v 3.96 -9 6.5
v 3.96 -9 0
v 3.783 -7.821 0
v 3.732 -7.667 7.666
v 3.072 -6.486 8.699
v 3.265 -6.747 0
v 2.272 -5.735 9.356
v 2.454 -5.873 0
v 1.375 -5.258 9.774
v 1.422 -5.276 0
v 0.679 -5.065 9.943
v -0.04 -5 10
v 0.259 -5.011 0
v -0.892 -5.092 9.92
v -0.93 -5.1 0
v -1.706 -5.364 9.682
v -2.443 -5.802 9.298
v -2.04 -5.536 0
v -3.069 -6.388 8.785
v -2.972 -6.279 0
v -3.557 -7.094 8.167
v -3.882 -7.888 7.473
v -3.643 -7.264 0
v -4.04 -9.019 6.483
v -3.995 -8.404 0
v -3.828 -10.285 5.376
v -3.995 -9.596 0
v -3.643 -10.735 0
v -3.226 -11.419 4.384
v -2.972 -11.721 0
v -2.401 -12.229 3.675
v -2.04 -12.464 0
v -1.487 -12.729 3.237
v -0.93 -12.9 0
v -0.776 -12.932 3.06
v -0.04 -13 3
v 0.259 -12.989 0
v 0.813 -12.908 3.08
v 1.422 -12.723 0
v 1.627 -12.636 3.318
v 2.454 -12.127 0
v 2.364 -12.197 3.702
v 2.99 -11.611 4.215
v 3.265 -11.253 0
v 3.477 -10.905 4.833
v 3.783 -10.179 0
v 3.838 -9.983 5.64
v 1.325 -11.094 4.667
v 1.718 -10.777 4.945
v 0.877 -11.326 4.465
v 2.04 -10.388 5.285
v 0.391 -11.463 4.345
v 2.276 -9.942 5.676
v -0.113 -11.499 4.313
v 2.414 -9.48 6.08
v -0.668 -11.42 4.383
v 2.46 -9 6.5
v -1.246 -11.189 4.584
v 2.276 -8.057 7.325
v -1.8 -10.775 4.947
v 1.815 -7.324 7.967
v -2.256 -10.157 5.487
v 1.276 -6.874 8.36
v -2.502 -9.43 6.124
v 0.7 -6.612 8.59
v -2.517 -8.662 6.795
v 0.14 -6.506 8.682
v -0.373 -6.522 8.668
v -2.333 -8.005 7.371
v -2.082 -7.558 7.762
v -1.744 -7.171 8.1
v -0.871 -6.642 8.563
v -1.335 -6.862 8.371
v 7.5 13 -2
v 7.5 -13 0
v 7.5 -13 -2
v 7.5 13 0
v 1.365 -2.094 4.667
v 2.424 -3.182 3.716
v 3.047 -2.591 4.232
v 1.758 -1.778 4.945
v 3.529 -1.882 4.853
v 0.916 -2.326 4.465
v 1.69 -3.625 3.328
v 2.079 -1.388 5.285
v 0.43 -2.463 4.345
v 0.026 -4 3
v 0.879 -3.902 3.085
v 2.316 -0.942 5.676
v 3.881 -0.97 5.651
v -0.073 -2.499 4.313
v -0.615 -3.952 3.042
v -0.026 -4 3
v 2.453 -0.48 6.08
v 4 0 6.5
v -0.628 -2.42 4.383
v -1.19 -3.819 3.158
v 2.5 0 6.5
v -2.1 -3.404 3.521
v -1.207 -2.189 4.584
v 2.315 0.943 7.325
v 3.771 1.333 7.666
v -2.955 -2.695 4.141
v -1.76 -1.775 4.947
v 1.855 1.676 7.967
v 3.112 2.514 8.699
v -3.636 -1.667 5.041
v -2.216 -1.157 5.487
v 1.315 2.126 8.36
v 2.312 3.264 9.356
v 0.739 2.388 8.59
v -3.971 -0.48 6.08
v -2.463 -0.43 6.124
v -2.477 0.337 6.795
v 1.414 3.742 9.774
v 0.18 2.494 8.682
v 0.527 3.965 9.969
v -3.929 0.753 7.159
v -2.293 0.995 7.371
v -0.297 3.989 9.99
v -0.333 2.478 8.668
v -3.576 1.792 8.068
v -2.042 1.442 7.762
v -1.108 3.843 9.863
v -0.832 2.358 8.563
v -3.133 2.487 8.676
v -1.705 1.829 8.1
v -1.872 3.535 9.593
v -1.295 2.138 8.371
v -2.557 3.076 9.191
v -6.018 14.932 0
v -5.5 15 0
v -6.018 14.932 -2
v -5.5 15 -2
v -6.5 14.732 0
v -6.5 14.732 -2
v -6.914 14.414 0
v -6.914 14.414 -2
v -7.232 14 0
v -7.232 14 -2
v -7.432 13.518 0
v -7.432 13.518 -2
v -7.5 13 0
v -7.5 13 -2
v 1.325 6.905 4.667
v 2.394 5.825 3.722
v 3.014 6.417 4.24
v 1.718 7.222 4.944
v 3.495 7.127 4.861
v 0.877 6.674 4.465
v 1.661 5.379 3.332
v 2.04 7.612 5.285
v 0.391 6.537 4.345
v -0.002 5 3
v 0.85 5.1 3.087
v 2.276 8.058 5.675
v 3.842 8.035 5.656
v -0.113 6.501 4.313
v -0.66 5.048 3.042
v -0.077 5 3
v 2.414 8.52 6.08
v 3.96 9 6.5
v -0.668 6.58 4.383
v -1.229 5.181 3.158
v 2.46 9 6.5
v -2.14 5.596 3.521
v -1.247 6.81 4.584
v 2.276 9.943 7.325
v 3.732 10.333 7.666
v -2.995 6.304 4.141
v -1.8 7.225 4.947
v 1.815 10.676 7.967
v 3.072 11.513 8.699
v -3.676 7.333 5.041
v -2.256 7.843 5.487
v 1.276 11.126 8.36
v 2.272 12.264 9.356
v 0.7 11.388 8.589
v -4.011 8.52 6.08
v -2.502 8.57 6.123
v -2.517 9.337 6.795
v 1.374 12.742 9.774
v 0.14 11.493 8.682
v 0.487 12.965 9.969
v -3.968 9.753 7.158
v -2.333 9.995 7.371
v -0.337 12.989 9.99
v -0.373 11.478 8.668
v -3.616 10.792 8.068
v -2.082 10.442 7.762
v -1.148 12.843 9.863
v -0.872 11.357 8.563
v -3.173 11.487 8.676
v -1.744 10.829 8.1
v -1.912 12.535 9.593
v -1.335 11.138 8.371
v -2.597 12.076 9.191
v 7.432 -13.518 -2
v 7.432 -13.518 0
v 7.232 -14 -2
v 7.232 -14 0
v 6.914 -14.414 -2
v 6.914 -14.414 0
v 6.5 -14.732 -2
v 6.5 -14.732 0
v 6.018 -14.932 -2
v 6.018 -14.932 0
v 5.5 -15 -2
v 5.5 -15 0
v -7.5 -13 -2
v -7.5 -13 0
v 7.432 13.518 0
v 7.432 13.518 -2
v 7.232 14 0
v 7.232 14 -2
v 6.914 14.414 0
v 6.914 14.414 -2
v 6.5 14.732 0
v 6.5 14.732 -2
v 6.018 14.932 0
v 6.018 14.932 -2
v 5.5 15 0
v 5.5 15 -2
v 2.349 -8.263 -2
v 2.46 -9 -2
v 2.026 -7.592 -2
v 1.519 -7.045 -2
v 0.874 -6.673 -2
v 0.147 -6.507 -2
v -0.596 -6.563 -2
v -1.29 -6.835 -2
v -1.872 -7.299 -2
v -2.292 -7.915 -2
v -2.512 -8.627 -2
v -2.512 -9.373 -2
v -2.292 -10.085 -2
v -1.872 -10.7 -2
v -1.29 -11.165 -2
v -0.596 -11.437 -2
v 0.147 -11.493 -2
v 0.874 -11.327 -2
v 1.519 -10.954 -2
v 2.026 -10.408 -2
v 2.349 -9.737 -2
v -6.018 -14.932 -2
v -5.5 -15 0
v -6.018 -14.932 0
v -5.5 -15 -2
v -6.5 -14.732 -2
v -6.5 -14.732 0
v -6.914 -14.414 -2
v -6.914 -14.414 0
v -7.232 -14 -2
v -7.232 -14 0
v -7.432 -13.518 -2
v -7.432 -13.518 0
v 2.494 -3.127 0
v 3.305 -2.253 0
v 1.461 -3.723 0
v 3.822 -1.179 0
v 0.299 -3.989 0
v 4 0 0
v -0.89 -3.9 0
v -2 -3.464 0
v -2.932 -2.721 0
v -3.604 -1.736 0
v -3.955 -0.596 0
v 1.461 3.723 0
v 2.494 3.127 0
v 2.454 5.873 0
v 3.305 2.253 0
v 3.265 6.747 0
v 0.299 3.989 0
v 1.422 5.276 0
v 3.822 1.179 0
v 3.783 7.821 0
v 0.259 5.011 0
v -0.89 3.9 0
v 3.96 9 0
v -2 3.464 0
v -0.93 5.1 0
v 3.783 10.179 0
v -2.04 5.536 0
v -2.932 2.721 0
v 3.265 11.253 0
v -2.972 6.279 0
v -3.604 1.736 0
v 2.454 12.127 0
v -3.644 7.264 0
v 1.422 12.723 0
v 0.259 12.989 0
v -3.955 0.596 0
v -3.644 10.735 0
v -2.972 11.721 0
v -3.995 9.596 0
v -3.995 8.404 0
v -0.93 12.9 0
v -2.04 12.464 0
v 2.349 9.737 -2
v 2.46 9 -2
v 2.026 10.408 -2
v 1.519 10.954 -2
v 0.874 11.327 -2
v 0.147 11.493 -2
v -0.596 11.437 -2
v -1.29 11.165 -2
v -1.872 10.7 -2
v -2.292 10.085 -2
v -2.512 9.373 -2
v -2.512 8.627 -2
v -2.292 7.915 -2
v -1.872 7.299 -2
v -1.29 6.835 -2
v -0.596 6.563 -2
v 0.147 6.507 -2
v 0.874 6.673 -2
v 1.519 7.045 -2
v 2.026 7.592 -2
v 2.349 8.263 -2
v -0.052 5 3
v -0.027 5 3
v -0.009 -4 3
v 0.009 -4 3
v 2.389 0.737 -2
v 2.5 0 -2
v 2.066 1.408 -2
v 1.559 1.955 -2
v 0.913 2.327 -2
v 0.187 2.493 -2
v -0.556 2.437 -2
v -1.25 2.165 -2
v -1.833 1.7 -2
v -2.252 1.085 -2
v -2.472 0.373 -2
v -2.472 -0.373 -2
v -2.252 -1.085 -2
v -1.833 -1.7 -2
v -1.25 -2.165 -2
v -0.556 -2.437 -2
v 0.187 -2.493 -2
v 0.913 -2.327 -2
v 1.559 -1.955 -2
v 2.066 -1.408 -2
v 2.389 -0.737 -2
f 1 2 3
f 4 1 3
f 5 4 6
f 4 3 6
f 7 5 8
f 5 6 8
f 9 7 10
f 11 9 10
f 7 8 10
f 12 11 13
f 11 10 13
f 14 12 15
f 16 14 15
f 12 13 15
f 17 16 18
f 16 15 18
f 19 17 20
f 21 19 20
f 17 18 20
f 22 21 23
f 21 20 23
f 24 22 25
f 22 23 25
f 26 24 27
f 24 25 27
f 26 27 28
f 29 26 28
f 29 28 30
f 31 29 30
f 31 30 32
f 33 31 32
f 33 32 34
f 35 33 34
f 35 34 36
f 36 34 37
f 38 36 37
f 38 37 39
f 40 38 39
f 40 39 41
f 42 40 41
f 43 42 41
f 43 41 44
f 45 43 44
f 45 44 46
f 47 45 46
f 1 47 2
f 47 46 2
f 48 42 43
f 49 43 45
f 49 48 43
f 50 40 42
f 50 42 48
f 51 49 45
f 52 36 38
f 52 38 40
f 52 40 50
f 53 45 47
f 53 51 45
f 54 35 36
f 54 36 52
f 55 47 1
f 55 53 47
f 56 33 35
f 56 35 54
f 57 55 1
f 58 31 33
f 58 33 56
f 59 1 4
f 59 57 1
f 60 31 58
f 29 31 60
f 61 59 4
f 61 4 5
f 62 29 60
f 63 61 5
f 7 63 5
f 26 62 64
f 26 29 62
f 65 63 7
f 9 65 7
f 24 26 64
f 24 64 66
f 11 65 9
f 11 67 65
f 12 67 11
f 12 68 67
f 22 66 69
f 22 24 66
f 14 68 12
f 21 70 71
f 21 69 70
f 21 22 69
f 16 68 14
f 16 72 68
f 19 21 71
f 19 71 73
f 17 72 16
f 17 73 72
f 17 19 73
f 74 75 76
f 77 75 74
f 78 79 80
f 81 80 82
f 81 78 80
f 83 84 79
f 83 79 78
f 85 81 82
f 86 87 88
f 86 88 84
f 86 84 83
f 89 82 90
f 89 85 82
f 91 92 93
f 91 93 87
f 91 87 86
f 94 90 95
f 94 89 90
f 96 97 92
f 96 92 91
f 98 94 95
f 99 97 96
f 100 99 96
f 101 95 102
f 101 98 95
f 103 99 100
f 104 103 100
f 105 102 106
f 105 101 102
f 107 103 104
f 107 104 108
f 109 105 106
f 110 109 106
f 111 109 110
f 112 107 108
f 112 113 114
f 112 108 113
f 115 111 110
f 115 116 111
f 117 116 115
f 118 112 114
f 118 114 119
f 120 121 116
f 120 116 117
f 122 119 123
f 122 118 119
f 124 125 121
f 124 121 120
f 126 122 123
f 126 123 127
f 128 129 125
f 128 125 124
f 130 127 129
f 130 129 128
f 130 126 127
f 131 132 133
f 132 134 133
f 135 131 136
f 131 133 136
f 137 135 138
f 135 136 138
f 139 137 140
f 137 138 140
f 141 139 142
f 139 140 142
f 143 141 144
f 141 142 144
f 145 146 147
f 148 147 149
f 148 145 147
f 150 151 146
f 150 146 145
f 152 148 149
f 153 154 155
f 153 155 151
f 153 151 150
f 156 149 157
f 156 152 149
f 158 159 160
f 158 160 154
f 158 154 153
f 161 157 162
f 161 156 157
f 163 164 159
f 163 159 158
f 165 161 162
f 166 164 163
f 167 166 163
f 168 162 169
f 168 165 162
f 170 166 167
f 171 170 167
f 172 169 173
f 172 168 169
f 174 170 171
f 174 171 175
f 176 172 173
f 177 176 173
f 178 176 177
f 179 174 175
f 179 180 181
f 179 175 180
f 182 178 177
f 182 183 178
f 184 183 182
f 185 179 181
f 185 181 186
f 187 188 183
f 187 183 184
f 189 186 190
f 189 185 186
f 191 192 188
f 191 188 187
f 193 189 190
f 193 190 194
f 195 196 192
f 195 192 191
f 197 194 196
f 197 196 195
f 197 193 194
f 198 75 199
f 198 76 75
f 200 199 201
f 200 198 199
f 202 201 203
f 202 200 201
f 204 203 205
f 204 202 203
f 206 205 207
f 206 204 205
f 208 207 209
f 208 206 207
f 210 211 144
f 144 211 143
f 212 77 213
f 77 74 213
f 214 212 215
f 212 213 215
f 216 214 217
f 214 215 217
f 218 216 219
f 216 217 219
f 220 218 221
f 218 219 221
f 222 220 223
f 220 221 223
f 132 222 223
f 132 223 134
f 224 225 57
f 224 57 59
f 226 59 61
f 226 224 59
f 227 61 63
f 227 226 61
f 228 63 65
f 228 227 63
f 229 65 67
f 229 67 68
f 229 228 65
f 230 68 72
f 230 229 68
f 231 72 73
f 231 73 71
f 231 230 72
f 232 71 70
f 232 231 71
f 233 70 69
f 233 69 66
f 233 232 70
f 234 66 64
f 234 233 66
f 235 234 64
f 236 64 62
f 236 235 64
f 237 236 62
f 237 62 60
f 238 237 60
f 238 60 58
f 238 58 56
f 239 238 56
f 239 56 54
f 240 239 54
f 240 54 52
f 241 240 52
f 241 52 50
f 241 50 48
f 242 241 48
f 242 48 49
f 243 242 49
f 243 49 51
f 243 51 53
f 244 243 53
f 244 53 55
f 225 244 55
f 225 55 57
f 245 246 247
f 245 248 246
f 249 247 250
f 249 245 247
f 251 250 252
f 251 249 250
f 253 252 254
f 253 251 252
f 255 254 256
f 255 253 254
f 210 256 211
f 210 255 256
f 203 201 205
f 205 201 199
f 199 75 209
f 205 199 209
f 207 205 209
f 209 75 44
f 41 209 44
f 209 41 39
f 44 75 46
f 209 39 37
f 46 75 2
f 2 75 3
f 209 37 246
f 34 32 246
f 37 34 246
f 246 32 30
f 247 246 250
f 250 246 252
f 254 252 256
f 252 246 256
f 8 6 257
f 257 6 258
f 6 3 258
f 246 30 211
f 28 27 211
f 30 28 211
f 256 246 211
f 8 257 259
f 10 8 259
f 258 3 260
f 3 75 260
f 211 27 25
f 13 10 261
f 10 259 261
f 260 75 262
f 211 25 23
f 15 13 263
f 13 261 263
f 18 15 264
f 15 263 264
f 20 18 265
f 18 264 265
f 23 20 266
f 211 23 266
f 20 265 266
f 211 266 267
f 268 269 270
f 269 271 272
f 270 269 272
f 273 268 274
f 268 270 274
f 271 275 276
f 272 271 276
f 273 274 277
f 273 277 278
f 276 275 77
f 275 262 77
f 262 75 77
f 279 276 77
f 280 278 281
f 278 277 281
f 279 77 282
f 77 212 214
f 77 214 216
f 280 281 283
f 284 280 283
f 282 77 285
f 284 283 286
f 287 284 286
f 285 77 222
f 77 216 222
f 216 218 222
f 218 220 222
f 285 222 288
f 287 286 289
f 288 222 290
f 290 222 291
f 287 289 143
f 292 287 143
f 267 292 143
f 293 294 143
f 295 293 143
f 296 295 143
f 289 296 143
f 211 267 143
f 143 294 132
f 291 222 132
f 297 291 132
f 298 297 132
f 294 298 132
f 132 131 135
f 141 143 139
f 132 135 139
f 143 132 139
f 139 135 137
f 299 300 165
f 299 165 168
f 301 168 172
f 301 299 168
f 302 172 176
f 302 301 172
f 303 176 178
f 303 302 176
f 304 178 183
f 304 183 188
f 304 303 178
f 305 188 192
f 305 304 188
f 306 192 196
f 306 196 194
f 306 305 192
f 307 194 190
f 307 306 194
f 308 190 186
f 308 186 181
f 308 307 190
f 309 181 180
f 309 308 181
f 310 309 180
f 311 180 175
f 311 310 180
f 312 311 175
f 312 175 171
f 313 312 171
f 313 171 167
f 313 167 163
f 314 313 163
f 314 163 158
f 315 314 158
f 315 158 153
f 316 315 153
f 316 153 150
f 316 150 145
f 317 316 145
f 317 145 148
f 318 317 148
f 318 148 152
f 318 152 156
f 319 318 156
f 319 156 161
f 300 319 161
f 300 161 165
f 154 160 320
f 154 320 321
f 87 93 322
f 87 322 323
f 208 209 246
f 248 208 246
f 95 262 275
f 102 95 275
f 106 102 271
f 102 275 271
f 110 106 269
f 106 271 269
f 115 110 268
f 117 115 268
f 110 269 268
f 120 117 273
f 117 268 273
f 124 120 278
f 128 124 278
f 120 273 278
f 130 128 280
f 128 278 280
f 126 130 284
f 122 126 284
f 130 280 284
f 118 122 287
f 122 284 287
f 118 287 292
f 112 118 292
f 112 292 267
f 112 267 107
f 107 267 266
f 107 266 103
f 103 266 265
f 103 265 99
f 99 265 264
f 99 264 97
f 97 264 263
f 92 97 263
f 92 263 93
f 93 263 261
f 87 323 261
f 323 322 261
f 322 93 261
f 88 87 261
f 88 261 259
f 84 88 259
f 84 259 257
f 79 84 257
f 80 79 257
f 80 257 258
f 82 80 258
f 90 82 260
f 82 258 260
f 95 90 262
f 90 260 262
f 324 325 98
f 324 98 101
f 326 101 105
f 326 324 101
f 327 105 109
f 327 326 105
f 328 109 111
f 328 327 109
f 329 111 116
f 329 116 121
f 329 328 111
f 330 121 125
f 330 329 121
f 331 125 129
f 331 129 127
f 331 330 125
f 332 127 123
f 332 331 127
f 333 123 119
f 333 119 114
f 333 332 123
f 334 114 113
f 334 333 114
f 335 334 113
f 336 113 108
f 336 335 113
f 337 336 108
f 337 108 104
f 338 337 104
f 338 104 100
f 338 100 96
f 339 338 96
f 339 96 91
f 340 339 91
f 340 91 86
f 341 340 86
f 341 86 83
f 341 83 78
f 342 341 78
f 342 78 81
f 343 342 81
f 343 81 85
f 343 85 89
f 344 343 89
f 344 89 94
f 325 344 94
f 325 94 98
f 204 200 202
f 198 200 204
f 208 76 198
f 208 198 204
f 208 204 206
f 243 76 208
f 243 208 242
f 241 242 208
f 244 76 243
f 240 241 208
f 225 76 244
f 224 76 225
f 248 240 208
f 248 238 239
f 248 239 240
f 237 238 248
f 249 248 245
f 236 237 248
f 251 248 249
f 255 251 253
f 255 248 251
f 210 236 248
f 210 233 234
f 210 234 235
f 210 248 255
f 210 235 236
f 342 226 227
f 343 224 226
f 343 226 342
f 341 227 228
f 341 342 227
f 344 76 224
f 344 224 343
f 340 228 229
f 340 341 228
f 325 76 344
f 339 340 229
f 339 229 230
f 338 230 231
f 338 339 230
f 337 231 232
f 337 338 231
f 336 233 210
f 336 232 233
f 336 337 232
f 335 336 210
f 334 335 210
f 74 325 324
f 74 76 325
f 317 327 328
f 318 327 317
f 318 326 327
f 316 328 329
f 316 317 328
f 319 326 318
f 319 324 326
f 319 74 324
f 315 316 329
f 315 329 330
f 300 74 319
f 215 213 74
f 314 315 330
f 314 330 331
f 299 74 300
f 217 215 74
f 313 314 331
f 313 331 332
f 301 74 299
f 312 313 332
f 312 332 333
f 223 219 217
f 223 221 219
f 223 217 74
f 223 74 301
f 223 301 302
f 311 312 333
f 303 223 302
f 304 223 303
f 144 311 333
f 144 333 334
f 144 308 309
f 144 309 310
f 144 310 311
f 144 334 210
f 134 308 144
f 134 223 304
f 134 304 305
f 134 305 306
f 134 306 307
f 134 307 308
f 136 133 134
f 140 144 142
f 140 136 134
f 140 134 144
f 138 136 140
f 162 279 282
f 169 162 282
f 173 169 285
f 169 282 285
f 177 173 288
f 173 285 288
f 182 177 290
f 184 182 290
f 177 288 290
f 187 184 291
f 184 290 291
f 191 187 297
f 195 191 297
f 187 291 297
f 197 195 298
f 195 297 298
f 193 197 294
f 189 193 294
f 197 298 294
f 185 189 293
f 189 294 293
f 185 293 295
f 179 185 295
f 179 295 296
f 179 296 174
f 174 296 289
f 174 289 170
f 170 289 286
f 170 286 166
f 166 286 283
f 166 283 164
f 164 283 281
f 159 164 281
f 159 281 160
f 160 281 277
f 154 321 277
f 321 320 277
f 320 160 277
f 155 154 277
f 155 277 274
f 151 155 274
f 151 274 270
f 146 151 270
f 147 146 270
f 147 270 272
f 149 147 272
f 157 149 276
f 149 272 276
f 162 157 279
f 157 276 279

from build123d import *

# Parameters (mm, degrees)
SKETCH1_R             = 4
SKETCH1_R_2           = 2.5
BOSS_EXTRUDE1_DEPTH   = 10
BOSS_EXTRUDE1_2_DEPTH = 10
BOSS_EXTRUDE1_3_DEPTH = 10
SKETCH2_W             = 15
SKETCH2_H             = 30
BOSS_EXTRUDE2_DEPTH   = 2
CUT_EXTRUDE1_START    = -2
SKETCH3_R             = 2.5
CUT_EXTRUDE1_DEPTH    = 2
CUT_EXTRUDE3_DEPTH    = 22
FILLET2_R             = 2


with BuildPart() as part:
    # Sketch1 → Boss-Extrude1 (new body)
    with BuildSketch(Plane.XY):
        with Locations((-0.039690435, 8.999912481)):
            Circle(SKETCH1_R)
        with Locations((-0.039690435, 8.999912481)):
            Circle(SKETCH1_R_2, mode=Mode.SUBTRACT)
    extrude(amount=BOSS_EXTRUDE1_DEPTH)



with BuildPart() as body_2:
    # Sketch1 → Boss-Extrude1 2 (new body)
    with BuildSketch(Plane.XY):
        Circle(SKETCH1_R)
        Circle(SKETCH1_R_2, mode=Mode.SUBTRACT)
    extrude(amount=BOSS_EXTRUDE1_2_DEPTH)


with BuildPart() as body_3:
    # Sketch1 → Boss-Extrude1 3 (new body)
    with BuildSketch(Plane.XY):
        with Locations((-0.039620931, -8.999912787)):
            Circle(SKETCH1_R)
        with Locations((-0.039620931, -8.999912787)):
            Circle(SKETCH1_R_2, mode=Mode.SUBTRACT)
    extrude(amount=BOSS_EXTRUDE1_3_DEPTH)


with BuildPart() as part_1:
    add(part.part)

    add(body_2.part)  # Boss-Extrude2 merges body 2

    add(body_3.part)  # Boss-Extrude2 merges body 3
    # Sketch2 → Boss-Extrude2 (add)
    with BuildSketch(Plane(origin=(0, 0, 0), x_dir=(-1, 0, 0), z_dir=(0, 0, -1))):
        Rectangle(SKETCH2_W, SKETCH2_H)
    extrude(amount=BOSS_EXTRUDE2_DEPTH)

    # Sketch3 → Cut-Extrude1 (cut)
    with BuildSketch(Plane.XY.offset(CUT_EXTRUDE1_START)):
        with Locations((-0.039690435, 8.999912481)):
            Circle(SKETCH3_R)
        Circle(SKETCH3_R)
        with Locations((-0.039620931, -8.999912787)):
            Circle(SKETCH3_R)
    extrude(amount=CUT_EXTRUDE1_DEPTH, mode=Mode.SUBTRACT)

    # Sketch4 → Cut-Extrude3 (cut)
    with BuildSketch(Plane.ZY.offset(7.5)):
        Polygon((10, 4.000087213), (10, -3.999912787), (10, -4.510778231), (3, -4.510778231), (3, -3.999912787), align=None)
        Polygon((10, 13.000087213), (10, 5.000087213), (10, 4.572676738), (3, 4.572676738), (3, 5.000087213), align=None)
        Polygon((10, -4.999912787), (10, -12.999912787), (10, -13.831411627), (3, -13.831411627), (3, -12.999912787), align=None)
    extrude(amount=-CUT_EXTRUDE3_DEPTH, mode=Mode.SUBTRACT)

    # Fillet2
    fillet2_edges = [part_1.edges().sort_by_distance(p)[0] for p in [
        (7.5, -15, -1),
        (-7.5, -15, -1),
        (-7.5, 15, -1),
        (7.5, 15, -1),
    ]]
    fillet(fillet2_edges, radius=FILLET2_R)


solid = part_1.part
